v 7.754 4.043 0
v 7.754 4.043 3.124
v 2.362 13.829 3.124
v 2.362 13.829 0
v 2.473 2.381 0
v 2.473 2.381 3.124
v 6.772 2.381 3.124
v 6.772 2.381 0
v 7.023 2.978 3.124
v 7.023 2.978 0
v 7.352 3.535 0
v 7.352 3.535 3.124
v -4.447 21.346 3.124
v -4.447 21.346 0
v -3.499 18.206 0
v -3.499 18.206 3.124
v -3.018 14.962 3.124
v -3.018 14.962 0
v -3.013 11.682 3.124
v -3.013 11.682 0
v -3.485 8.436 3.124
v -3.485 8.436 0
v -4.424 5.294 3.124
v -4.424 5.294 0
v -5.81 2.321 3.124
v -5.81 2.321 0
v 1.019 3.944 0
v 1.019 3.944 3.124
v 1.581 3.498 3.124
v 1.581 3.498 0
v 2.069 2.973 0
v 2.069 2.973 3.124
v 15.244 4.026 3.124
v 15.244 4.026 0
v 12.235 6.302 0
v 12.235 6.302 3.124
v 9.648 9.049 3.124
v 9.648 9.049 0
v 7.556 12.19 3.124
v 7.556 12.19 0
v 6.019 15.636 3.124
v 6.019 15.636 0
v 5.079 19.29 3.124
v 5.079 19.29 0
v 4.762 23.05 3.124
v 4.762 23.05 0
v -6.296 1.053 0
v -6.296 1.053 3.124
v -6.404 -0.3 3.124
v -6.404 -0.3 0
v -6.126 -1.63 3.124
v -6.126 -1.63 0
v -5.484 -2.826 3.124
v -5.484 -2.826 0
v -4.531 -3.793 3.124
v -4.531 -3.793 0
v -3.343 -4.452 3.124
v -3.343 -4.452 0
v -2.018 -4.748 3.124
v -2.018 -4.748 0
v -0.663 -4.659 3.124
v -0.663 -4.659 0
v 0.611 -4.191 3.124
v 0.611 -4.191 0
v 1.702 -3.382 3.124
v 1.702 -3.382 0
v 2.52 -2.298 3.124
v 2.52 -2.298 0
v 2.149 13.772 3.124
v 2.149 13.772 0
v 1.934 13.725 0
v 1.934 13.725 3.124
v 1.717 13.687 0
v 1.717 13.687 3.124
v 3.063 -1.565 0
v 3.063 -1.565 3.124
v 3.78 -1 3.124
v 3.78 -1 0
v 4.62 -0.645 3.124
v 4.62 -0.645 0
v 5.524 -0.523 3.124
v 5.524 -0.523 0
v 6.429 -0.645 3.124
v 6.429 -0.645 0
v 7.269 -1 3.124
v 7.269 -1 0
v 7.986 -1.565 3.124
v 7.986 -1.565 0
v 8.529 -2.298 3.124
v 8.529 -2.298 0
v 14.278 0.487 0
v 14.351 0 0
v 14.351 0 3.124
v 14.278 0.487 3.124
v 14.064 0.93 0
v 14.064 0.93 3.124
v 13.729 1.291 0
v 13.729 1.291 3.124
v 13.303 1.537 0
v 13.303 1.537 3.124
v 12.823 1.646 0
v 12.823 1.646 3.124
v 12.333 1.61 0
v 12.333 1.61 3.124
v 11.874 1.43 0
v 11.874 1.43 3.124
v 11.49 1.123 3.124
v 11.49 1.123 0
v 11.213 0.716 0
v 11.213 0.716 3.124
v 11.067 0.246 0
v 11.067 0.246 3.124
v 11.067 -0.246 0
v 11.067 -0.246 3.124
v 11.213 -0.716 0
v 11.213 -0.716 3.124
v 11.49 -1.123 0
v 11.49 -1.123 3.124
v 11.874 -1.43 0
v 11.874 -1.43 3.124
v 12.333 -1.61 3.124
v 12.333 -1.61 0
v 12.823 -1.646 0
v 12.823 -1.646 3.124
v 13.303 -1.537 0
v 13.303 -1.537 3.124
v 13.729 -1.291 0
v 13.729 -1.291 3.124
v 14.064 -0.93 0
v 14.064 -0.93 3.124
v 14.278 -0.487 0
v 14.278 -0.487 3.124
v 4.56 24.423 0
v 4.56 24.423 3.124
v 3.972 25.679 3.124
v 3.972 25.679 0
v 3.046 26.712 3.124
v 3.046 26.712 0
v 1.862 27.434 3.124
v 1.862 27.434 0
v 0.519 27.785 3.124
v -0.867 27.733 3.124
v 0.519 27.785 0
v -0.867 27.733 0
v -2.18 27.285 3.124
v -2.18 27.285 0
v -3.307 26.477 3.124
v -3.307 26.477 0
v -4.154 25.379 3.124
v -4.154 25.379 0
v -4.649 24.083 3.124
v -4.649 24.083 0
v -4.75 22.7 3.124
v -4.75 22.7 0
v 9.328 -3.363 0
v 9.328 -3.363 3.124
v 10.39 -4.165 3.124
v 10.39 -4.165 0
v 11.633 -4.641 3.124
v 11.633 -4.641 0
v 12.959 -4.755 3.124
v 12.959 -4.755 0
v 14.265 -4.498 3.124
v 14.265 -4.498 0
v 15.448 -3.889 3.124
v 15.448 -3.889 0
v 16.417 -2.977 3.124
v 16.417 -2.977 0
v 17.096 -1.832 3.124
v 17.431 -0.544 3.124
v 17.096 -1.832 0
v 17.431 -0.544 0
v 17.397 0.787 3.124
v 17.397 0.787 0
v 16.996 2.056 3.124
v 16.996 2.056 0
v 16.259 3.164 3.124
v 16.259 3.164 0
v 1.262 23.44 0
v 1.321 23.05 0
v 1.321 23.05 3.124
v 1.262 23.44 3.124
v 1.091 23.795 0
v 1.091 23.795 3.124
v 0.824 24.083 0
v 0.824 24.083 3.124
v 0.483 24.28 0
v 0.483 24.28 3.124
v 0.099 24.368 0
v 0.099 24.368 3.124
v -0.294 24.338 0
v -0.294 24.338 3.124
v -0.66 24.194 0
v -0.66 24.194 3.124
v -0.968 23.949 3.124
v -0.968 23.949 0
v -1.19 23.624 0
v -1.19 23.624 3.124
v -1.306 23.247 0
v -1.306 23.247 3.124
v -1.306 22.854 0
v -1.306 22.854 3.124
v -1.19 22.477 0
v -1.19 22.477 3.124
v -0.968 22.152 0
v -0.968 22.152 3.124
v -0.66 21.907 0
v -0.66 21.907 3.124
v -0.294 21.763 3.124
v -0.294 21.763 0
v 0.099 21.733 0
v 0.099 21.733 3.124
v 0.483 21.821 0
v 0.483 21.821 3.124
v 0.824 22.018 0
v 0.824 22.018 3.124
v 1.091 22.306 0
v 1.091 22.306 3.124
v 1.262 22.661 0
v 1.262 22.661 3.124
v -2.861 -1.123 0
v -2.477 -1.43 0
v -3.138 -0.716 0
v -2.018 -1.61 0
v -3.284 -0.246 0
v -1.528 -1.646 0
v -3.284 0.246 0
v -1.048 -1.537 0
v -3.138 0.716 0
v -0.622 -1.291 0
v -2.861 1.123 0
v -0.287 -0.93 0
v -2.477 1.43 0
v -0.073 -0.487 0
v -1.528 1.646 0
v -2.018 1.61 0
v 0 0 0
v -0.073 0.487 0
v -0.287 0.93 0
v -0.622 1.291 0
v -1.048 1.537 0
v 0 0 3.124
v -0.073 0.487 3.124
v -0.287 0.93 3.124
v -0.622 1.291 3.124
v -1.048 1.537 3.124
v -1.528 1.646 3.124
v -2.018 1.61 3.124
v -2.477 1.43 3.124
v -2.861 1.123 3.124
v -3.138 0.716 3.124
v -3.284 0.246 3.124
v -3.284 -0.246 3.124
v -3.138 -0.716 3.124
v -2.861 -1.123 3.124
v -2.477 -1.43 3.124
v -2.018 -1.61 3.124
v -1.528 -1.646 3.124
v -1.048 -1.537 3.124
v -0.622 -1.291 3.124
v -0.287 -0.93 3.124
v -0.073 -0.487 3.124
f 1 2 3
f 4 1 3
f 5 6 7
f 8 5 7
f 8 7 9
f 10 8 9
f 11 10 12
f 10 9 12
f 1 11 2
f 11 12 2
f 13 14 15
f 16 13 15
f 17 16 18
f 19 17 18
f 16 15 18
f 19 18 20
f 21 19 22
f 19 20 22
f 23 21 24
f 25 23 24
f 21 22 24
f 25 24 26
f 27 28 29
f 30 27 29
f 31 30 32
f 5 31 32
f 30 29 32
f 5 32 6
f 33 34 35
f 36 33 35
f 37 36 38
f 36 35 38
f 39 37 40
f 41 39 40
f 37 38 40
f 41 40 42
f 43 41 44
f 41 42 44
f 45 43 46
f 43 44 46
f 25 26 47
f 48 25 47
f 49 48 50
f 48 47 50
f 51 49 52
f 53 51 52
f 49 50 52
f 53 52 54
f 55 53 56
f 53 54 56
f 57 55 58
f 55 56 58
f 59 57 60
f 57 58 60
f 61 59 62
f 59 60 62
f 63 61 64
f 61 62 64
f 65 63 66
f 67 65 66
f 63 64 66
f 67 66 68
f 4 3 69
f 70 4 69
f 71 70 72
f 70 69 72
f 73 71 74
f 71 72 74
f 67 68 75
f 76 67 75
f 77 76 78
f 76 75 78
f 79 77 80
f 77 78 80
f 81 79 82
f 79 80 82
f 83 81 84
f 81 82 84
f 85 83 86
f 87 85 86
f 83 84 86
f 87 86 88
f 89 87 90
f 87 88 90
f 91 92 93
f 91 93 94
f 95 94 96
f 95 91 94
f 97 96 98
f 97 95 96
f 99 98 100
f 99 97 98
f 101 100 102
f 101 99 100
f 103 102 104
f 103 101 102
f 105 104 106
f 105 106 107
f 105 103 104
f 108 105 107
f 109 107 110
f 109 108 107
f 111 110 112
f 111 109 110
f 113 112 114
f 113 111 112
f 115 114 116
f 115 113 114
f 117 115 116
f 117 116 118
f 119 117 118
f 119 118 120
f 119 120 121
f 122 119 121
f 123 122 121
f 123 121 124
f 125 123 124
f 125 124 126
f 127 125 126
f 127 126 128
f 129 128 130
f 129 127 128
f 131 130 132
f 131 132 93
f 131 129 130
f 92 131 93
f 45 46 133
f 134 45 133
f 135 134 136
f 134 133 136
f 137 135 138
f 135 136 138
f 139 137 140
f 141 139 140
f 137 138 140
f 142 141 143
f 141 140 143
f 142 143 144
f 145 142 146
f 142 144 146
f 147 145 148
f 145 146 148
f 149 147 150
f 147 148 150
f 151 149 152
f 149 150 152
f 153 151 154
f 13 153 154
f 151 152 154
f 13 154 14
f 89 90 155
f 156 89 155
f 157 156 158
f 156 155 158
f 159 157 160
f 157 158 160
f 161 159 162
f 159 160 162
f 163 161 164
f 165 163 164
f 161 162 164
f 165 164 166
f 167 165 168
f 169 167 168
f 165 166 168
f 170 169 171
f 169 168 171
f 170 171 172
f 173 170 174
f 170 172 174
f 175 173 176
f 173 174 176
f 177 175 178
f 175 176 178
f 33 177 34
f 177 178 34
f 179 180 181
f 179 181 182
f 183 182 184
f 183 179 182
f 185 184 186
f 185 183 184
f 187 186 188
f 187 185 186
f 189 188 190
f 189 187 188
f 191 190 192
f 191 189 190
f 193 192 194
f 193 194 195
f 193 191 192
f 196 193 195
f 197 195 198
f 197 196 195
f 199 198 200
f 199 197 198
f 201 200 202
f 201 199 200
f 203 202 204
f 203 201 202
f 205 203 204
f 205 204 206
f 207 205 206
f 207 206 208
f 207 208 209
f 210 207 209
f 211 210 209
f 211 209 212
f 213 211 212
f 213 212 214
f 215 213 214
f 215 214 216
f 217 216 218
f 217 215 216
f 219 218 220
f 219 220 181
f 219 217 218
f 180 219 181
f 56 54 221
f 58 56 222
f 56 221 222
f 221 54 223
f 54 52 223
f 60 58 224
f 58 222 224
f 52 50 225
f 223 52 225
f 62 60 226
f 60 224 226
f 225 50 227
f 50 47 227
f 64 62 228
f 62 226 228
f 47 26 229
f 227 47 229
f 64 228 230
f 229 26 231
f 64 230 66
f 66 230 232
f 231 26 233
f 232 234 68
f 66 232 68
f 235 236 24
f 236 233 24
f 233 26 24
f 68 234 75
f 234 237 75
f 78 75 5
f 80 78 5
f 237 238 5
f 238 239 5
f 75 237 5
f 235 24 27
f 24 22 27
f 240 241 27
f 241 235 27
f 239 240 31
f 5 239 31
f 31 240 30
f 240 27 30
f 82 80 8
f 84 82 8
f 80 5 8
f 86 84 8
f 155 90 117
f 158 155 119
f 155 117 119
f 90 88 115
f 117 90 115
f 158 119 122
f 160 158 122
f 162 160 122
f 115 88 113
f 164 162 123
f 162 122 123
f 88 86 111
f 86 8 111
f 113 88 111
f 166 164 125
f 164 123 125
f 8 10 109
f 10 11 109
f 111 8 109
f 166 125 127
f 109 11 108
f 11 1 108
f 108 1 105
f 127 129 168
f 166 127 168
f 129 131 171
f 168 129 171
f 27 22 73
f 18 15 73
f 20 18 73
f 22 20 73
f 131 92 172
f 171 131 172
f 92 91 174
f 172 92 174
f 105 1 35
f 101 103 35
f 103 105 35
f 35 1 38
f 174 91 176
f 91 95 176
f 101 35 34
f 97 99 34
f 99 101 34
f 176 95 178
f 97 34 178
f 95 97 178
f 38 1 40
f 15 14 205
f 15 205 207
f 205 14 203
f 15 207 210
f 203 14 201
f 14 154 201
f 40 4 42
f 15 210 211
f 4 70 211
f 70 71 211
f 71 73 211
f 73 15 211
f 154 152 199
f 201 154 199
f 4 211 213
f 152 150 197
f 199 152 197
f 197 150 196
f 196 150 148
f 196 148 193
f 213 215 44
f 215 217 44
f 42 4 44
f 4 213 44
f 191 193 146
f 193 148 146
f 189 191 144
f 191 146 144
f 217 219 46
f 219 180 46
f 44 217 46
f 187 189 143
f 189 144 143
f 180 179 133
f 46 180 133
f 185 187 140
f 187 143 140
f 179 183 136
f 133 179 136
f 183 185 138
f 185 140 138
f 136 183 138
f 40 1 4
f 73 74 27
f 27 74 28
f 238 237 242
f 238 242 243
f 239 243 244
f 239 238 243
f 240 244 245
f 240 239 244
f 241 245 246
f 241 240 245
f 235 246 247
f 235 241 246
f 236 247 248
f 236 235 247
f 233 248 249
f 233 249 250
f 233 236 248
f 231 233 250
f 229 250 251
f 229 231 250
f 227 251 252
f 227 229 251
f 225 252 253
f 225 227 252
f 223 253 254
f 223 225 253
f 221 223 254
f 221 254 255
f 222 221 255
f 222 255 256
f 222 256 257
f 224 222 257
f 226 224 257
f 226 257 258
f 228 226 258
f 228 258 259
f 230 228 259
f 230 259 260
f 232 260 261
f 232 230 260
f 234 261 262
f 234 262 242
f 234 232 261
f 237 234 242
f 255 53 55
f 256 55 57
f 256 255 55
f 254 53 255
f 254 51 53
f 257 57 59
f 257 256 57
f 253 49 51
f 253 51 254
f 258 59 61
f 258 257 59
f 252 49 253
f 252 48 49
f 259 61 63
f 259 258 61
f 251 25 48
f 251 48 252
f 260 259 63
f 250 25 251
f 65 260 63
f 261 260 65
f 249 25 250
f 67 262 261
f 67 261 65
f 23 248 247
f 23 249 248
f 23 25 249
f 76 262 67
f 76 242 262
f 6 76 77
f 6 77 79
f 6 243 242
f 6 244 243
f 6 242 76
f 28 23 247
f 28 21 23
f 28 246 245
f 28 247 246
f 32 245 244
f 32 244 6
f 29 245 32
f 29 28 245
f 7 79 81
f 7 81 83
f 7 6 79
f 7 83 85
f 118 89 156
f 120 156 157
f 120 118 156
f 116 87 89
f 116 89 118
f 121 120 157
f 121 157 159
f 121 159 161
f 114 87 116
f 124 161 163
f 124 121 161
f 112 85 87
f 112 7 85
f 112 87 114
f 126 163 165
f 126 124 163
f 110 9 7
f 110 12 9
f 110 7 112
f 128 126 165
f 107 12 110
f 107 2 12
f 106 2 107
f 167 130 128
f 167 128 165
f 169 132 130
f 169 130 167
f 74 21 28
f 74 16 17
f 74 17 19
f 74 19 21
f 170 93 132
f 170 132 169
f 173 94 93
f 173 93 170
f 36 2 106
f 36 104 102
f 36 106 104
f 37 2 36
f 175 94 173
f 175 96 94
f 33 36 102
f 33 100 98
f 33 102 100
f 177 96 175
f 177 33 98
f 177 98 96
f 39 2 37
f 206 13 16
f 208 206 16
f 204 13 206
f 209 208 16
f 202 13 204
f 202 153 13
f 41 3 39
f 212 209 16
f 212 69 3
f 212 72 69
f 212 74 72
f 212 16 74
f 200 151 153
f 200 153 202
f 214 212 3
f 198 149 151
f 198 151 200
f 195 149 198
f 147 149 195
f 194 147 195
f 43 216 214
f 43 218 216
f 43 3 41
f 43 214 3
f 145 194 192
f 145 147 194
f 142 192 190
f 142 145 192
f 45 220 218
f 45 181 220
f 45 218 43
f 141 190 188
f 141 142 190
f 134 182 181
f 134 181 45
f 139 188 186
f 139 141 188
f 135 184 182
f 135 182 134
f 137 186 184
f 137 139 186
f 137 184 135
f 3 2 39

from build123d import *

# Parameters (mm, degrees)
CROQUIS1_R              = 1.651
CROQUIS1_R_2            = 1.3208
SALIENTE_EXTRUIR1_DEPTH = 3.1242
CORTAR_EXTRUIR1_DEPTH   = 3.1242


with BuildPart() as part:
    # Croquis1 → Saliente-Extruir1 (new body)
    with BuildSketch(Plane.XY):
        with BuildLine():
            ThreePointArc((2.520278818, -2.298225244), (5.5245, -0.523415469), (8.528721182, -2.298225244))
            ThreePointArc((8.528721182, -2.298225244), (15.964986845, -3.467169905), (15.244404767, 4.025842847))
            ThreePointArc((15.244404767, 4.025842847), (7.556394525, 12.189930179), (4.7625, 23.0505))
            ThreePointArc((4.7625, 23.0505), (-0.866847253, 27.733445877), (-4.446941298, 21.345765609))
            ThreePointArc((-4.446941298, 21.345765609), (-3.013234987, 11.681947272), (-5.809588918, 2.321108456))
            ThreePointArc((-5.809588918, 2.321108456), (-3.960675565, -4.164949584), (2.520278818, -2.298225244))
        make_face()
        with Locations((-1.651, 0)):
            Circle(CROQUIS1_R, mode=Mode.SUBTRACT)
        Polygon((4.638514436, 4.7625), (3.464816339, 4.7625), (3.599843554, 6.647687651), align=None, mode=Mode.SUBTRACT)
        with Locations((0, 23.0505)):
            Circle(CROQUIS1_R_2, mode=Mode.SUBTRACT)
        with Locations((12.7, 0)):
            Circle(CROQUIS1_R, mode=Mode.SUBTRACT)
    extrude(amount=SALIENTE_EXTRUIR1_DEPTH)

    # Croquis2 → Cortar-Extruir1 (cut)
    with BuildSketch(Plane.XY.offset(3.1242)):
        with BuildLine():
            ThreePointArc((6.772401381, 2.38125), (7.178118311, 3.26217793), (7.753887726, 4.042645627))
            Line((7.753887726, 4.042645627), (2.361995667, 13.828929715))
            ThreePointArc((2.361995667, 13.828929715), (2.041810785, 13.746918232), (1.71670875, 13.687311946))
            Line((1.71670875, 13.687311946), (1.018825269, 3.943784893))
            ThreePointArc((1.018825269, 3.943784893), (1.834815442, 3.24507272), (2.473445986, 2.38125))
            Line((2.473445986, 2.38125), (6.772401381, 2.38125))
        make_face()
    extrude(amount=-CORTAR_EXTRUIR1_DEPTH, mode=Mode.SUBTRACT)


solid = part.part
